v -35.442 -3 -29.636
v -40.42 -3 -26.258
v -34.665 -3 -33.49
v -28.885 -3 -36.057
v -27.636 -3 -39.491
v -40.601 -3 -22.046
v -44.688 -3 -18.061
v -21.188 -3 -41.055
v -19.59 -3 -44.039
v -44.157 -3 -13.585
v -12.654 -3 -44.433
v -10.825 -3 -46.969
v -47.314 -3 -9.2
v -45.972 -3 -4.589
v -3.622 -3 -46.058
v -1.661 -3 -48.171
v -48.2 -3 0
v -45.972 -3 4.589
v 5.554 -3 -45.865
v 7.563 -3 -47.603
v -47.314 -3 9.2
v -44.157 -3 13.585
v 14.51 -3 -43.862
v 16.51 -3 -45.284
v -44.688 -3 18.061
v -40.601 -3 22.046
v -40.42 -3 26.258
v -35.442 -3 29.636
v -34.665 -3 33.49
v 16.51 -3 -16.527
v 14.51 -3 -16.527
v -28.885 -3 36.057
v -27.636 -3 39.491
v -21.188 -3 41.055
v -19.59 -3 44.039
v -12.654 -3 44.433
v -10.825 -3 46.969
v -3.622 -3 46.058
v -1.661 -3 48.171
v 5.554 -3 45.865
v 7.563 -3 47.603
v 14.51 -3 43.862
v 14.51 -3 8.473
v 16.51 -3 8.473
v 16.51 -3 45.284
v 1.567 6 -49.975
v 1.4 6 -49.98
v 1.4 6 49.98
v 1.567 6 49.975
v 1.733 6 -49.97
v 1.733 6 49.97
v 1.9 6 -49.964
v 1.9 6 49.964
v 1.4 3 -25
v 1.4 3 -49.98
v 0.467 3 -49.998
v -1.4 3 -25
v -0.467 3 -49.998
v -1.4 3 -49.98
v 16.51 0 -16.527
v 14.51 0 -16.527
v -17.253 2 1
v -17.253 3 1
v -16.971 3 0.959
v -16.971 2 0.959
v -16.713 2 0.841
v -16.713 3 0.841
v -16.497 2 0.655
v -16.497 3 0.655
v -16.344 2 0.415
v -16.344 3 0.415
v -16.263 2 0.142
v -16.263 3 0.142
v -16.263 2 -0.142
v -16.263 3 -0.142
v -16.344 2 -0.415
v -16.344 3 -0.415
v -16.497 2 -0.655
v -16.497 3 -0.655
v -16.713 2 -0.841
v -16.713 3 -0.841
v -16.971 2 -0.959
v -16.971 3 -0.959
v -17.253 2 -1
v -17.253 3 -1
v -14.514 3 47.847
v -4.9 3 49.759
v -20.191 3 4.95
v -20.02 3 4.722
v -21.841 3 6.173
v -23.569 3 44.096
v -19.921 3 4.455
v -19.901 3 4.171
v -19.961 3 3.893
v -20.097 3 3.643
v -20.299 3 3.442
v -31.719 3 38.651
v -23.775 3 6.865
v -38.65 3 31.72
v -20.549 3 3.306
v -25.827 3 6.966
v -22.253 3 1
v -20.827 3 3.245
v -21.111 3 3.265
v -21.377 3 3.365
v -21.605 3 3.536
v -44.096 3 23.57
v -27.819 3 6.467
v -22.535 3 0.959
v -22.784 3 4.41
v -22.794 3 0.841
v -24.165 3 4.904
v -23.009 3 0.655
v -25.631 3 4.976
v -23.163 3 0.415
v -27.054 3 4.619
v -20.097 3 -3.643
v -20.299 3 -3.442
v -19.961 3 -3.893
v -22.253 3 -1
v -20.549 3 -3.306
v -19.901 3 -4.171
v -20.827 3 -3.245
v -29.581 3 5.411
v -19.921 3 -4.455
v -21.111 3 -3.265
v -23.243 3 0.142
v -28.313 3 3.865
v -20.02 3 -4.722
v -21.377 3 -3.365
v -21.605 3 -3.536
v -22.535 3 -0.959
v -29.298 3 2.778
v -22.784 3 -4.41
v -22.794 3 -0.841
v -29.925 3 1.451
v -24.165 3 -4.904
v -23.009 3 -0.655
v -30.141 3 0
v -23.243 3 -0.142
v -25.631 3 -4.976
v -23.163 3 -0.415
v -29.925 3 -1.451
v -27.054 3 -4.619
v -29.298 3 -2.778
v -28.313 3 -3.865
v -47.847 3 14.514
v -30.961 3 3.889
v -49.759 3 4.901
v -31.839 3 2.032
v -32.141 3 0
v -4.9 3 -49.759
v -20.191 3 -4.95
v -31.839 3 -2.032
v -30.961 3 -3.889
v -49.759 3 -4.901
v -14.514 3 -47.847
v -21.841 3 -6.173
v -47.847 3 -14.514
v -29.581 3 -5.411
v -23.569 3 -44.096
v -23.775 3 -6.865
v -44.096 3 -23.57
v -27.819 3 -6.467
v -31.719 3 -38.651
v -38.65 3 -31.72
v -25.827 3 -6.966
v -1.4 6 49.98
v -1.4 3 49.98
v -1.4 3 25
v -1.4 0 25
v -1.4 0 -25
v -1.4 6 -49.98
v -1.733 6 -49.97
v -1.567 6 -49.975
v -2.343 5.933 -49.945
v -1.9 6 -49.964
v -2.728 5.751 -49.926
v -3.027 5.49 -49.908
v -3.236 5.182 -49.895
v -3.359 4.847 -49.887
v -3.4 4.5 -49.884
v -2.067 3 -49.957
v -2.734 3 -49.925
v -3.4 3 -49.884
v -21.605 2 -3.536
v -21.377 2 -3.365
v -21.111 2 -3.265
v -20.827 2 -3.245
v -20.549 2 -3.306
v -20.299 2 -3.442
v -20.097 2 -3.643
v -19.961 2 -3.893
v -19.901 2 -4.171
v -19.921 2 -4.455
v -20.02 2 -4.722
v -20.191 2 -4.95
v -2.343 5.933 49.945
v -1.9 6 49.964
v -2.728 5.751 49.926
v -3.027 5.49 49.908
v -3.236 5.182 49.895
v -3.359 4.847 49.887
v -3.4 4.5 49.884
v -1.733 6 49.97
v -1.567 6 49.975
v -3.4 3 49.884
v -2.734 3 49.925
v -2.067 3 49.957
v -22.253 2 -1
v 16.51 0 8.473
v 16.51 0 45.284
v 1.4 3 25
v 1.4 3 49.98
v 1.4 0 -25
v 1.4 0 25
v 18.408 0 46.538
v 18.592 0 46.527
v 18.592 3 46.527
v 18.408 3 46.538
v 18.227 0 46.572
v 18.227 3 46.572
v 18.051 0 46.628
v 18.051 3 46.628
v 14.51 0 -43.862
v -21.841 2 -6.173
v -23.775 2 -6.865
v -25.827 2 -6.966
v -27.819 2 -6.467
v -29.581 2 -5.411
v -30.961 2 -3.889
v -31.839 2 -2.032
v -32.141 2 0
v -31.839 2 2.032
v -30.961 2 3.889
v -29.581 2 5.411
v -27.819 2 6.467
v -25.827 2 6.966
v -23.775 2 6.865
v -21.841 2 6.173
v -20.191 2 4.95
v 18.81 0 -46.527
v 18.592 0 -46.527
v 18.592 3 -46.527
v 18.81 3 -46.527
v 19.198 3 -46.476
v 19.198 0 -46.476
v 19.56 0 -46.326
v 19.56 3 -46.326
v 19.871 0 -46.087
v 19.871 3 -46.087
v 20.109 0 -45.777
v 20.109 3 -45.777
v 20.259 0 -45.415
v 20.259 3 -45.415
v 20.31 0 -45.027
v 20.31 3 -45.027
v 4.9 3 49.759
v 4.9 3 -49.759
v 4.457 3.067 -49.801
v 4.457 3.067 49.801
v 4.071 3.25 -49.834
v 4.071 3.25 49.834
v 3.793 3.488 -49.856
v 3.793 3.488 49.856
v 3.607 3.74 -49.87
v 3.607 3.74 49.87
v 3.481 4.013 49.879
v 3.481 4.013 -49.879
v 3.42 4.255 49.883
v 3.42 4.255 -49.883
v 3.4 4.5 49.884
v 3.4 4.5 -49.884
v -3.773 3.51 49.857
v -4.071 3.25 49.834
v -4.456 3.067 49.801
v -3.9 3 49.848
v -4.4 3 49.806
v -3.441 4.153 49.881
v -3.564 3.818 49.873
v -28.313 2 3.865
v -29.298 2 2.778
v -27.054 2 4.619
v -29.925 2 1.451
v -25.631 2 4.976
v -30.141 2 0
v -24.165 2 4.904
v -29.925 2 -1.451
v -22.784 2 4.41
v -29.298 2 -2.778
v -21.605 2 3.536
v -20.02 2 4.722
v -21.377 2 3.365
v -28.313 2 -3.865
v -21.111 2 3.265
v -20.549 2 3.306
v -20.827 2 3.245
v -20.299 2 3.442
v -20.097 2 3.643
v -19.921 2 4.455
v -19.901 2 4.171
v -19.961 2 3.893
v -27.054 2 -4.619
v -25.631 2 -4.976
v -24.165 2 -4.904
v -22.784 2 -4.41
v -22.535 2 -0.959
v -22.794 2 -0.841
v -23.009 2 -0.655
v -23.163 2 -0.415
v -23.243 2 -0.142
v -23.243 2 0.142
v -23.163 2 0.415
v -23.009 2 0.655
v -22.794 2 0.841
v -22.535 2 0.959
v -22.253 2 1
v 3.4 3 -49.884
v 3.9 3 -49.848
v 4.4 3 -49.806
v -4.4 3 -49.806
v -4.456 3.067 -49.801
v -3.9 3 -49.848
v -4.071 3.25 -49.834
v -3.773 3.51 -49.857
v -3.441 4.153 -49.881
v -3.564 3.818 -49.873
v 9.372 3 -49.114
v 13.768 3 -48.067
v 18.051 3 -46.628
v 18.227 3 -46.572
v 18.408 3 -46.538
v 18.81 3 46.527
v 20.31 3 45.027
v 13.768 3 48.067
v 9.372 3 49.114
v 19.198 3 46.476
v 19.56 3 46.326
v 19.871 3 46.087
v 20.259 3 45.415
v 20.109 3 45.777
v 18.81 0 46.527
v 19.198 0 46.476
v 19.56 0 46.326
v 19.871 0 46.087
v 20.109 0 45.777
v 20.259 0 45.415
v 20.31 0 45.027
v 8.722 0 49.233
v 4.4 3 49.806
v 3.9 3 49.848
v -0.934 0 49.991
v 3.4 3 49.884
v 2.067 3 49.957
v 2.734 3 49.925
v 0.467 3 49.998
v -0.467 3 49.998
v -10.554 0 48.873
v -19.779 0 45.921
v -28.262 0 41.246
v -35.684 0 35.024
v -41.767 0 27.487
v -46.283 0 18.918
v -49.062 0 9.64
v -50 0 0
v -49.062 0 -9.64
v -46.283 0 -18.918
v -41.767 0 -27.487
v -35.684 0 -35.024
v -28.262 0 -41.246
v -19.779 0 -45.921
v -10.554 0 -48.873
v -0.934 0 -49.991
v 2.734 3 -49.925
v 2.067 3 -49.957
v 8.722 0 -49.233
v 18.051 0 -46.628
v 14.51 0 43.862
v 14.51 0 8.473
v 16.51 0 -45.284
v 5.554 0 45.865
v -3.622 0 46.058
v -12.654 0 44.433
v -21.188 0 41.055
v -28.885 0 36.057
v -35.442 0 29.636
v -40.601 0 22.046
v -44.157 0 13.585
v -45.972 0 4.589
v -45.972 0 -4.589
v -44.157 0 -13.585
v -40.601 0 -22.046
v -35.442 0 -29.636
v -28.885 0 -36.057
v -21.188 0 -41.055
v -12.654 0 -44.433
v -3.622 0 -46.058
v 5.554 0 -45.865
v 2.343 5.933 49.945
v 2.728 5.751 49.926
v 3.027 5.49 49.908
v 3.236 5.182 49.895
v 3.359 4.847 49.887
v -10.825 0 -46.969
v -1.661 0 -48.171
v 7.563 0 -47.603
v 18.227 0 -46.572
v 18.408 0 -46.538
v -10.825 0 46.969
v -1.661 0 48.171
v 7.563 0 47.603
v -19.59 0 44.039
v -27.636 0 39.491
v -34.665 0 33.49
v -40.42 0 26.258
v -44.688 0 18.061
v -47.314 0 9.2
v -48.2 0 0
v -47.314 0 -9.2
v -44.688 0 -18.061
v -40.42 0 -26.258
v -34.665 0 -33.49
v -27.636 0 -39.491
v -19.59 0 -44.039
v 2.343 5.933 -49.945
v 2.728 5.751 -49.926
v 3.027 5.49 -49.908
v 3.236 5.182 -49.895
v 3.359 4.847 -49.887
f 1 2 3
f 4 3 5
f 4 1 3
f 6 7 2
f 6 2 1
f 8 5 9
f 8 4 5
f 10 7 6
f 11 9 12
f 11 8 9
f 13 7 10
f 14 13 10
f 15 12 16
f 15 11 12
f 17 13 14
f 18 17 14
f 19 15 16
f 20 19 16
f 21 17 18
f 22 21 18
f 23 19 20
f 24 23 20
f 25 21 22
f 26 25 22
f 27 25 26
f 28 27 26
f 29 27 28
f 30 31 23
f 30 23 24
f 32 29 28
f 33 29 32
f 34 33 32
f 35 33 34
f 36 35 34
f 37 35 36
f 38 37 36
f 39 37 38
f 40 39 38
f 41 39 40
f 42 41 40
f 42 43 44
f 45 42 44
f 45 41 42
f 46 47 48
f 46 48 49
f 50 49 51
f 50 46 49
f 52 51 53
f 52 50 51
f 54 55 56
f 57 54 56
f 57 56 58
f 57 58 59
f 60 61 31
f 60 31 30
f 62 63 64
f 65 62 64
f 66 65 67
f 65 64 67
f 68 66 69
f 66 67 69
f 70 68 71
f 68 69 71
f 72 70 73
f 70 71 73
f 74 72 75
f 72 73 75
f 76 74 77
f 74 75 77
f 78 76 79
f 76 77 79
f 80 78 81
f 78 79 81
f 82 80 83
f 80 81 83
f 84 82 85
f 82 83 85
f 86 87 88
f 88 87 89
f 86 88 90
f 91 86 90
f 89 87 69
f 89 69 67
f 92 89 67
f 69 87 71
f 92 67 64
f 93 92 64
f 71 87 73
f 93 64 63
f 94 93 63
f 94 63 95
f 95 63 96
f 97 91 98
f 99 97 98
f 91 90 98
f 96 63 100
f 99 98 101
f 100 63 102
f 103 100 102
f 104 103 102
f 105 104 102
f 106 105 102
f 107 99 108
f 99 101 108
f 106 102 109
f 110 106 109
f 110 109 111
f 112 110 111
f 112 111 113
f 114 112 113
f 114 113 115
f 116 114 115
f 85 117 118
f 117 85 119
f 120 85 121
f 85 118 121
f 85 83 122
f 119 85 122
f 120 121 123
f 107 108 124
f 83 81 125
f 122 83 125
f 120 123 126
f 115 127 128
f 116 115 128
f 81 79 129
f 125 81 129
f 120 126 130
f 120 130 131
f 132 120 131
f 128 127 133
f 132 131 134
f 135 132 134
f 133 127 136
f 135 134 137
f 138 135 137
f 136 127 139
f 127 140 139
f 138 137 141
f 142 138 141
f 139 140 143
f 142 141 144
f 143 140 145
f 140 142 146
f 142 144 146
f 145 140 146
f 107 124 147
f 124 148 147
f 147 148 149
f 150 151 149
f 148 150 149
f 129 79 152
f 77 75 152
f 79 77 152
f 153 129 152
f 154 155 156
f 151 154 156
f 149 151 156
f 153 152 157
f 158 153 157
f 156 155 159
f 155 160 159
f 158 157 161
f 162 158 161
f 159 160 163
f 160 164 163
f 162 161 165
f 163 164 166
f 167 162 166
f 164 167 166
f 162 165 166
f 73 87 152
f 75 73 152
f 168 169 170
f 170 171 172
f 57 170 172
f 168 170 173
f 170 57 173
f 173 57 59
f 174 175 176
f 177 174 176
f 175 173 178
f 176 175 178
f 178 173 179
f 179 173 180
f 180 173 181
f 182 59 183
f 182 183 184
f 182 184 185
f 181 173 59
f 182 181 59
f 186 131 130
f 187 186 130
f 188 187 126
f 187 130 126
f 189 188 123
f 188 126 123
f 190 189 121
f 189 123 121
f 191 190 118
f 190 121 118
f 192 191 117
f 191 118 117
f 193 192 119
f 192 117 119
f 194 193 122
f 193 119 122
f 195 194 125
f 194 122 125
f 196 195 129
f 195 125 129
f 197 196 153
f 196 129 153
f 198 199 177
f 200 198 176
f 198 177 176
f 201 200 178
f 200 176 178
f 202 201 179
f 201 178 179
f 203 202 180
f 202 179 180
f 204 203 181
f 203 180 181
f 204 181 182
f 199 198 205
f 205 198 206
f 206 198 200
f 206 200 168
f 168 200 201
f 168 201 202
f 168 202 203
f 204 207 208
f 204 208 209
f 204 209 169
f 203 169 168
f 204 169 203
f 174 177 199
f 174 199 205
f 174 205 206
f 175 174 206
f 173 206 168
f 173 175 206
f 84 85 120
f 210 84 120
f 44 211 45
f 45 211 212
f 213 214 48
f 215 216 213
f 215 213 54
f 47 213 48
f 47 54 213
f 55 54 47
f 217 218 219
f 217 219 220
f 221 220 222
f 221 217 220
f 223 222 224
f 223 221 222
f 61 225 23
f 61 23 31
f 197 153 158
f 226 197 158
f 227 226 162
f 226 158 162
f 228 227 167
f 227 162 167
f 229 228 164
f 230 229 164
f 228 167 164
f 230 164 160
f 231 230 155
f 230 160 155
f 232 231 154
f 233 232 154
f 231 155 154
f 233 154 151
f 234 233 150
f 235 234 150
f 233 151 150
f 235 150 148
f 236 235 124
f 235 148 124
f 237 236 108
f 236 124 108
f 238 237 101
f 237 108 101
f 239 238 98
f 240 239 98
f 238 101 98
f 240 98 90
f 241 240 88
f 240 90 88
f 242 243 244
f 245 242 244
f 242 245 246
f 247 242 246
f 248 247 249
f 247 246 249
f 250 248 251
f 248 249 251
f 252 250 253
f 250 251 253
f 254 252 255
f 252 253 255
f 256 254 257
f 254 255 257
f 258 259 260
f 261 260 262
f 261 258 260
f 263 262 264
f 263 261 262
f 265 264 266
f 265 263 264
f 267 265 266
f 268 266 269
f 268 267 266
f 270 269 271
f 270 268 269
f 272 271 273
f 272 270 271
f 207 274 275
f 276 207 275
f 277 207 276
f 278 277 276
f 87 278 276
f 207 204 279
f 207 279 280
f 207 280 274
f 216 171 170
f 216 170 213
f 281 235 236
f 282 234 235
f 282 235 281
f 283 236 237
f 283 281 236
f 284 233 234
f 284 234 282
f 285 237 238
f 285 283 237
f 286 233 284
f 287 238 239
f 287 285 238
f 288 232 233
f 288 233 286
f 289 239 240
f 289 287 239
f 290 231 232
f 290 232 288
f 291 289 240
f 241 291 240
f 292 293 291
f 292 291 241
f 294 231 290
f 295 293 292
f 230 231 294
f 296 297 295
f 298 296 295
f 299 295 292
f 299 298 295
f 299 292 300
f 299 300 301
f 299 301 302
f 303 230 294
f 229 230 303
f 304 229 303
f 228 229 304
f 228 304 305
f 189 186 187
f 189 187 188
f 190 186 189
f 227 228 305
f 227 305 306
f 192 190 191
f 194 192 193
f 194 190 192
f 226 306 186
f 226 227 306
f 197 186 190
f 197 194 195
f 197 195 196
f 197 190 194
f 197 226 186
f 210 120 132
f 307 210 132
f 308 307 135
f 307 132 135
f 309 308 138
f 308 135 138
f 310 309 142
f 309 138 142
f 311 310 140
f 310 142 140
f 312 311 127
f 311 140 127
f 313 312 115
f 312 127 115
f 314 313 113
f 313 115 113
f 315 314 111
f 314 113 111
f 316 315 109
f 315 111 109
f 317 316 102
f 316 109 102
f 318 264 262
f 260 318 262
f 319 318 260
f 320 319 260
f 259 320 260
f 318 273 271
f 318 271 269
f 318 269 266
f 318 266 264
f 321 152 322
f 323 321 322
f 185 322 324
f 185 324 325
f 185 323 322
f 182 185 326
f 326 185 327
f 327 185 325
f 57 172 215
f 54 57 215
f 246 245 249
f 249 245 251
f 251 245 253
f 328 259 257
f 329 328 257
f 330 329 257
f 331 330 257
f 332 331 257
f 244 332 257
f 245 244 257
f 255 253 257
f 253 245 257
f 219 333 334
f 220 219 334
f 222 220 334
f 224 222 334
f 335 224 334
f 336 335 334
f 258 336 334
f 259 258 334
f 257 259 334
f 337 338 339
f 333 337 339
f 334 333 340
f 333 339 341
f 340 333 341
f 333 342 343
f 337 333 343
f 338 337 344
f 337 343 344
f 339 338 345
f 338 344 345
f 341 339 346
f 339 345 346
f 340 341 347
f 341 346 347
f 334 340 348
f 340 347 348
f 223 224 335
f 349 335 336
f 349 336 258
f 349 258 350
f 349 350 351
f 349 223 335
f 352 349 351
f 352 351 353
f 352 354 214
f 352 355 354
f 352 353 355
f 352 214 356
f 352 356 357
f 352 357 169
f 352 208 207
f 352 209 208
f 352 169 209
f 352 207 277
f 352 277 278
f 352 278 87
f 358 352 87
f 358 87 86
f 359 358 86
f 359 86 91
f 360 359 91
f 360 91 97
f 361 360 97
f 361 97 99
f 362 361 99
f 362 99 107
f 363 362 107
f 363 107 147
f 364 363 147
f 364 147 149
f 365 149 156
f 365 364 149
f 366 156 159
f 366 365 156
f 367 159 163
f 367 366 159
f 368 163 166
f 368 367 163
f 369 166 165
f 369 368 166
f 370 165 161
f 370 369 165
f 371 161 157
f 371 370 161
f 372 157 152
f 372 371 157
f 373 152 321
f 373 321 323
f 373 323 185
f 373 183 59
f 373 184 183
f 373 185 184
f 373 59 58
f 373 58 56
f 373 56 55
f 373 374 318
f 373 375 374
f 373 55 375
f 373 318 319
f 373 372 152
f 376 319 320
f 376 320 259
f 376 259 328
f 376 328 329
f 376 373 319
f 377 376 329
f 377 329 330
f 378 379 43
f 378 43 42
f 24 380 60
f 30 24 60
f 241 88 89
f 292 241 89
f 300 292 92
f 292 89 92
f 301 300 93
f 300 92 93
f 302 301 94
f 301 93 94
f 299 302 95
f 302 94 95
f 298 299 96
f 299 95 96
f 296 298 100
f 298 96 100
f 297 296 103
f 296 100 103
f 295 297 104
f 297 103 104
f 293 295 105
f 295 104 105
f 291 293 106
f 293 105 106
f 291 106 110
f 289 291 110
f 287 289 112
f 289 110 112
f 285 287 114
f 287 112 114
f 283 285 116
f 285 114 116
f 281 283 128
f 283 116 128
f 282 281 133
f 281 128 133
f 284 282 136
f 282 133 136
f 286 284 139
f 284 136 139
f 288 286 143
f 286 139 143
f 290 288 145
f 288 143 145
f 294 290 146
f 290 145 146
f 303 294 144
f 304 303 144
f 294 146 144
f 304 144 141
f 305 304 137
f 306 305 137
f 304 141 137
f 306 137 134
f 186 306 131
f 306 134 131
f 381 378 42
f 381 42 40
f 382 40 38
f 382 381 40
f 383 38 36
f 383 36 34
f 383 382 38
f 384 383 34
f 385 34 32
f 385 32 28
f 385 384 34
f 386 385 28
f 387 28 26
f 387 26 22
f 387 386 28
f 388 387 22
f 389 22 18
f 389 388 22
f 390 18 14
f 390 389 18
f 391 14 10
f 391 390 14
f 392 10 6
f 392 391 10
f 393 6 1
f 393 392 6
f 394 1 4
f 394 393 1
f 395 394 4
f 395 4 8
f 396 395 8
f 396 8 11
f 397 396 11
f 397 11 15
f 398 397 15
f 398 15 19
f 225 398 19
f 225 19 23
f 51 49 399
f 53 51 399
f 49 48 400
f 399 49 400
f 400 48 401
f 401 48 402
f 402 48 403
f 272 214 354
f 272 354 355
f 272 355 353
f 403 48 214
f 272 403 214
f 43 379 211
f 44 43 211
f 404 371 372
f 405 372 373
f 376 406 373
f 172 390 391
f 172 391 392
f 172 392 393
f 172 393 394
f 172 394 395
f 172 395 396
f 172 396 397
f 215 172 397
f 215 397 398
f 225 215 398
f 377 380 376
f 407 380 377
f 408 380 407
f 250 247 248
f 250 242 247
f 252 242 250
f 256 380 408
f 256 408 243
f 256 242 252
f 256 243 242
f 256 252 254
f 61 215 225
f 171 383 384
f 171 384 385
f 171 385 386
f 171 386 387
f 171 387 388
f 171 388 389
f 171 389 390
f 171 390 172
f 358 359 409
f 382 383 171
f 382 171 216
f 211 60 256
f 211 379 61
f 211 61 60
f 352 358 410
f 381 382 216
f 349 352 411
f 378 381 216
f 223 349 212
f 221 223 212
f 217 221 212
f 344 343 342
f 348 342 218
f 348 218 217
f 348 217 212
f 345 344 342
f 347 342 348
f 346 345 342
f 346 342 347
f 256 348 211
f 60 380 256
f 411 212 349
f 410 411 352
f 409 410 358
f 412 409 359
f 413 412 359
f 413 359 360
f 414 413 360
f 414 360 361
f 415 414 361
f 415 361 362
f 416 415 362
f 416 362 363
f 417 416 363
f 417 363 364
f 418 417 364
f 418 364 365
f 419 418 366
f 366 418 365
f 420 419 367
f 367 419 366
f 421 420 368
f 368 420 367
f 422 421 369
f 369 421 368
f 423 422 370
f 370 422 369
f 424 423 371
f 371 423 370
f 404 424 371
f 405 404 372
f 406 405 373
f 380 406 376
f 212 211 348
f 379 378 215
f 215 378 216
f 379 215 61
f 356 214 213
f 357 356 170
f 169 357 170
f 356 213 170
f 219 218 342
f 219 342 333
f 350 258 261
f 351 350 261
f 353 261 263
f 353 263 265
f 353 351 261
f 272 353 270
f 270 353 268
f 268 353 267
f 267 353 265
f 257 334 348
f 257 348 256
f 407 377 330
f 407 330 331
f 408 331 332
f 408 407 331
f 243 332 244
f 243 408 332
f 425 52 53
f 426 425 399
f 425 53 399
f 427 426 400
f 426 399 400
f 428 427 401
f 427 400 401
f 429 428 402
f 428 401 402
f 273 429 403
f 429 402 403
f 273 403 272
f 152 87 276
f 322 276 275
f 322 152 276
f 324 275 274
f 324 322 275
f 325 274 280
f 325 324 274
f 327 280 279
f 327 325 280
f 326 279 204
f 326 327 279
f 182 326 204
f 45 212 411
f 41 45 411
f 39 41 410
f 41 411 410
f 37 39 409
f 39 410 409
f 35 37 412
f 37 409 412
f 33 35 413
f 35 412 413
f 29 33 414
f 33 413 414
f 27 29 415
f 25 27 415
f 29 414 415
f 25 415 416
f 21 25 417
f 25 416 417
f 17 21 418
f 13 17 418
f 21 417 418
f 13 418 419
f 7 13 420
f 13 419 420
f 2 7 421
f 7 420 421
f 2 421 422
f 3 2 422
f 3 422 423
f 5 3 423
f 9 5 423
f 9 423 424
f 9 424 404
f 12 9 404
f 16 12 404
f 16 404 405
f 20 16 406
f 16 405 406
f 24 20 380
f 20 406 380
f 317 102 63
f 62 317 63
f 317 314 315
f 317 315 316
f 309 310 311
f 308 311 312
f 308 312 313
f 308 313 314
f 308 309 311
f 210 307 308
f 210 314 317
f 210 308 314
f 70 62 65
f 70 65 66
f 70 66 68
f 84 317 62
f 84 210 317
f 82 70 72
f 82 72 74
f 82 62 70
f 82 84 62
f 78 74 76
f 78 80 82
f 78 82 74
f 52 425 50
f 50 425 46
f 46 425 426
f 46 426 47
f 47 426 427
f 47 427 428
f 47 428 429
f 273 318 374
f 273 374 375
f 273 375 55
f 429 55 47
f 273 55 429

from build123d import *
from build123d.topology import SkipClean

# Parameters (mm, degrees)
BOSS_EXTRUDE1_DEPTH     = 3
CUT_EXTRUDE1_DEPTH      = 71.774289117
CUT_EXTRUDE1_DEPTH_BACK = 71.774289117
SKETCH2_W               = 2.8
SKETCH2_H               = 50
BOSS_EXTRUDE2_DEPTH     = 3
SKETCH4_W               = 2
SKETCH4_H               = 25
CUT_EXTRUDE2_DEPTH      = 3
BOSS_EXTRUDE3_DEPTH     = 3
SKETCH7_W               = 93.053616802
SKETCH7_H               = 3
BOSS_EXTRUDE4_DEPTH     = 2
CUT_EXTRUDE3_DEPTH      = 1
FILLET1_R               = 1.5


with BuildPart() as part:
    # Sketch1 → Boss-Extrude1 (new body)
    with BuildSketch(Plane(origin=(0, 0, 0), x_dir=(1, 0, 0), z_dir=(0, 1, 0))):
        with BuildLine():
            Line((18.31, 46.526808401), (18.31, -46.526808401))
            ThreePointArc((18.31, -46.526808401), (-50, 0), (18.31, 46.526808401))
        make_face()
    extrude(amount=BOSS_EXTRUDE1_DEPTH)

    # Sketch2 → Cut-Extrude1 (cut, two sides: drawn at the far end of the back side and taken through both)
    with BuildSketch(Plane(origin=(0, 3, 0), x_dir=(1, 0, 0), z_dir=(0, 1, 0)).offset(-CUT_EXTRUDE1_DEPTH_BACK)):
        Rectangle(SKETCH2_W, SKETCH2_H)
    extrude(amount=CUT_EXTRUDE1_DEPTH + CUT_EXTRUDE1_DEPTH_BACK, mode=Mode.SUBTRACT)

    # Sketch3 → Boss-Extrude2 (add)
    with BuildSketch(Plane.XZ):
        with BuildLine():
            Line((16.51, -45.284212481), (16.51, 45.284212481))
            ThreePointArc((16.51, 45.284212481), (-48.2, 0), (16.51, -45.284212481))
        make_face()
        with BuildLine():
            Line((14.51, -43.862283342), (14.51, 43.862283342))
            ThreePointArc((14.51, 43.862283342), (-46.2, 0), (14.51, -43.862283342))
        make_face(mode=Mode.SUBTRACT)
    extrude(amount=BOSS_EXTRUDE2_DEPTH)

    # Sketch4 → Cut-Extrude2 (cut)
    with BuildSketch(Plane.XZ.offset(3)):
        with Locations((15.51, -4.026808401)):
            Rectangle(SKETCH4_W, SKETCH4_H)
    extrude(amount=-CUT_EXTRUDE2_DEPTH, mode=Mode.SUBTRACT)

    # Sketch6 → Boss-Extrude3 (add)
    with SkipClean():  # the faces are left unmerged after this step: merging them gives an invalid solid
        with BuildSketch(Plane(origin=(0, 3, 0), x_dir=(1, 0, 0), z_dir=(0, 1, 0))):
            with BuildLine():
                Line((-1.4, 25), (-1.4, 49.980396157))
                ThreePointArc((-1.4, 49.980396157), (-2.400481254, 49.942343655), (-3.4, 49.884266057))
                Line((-3.4, 49.884266057), (-3.4, -49.884266057))
                ThreePointArc((-3.4, -49.884266057), (-2.400481254, -49.942343655), (-1.4, -49.980396157))
                Line((-1.4, -49.980396157), (-1.4, -25))
                Line((-1.4, -25), (-1.4, 25))
            make_face()
            with BuildLine():
                ThreePointArc((3.4, 49.884266057), (2.400481254, 49.942343655), (1.4, 49.980396157))
                Line((1.4, 49.980396157), (1.4, 25))
                Line((1.4, 25), (1.4, -25))
                Line((1.4, -25), (1.4, -49.980396157))
                ThreePointArc((1.4, -49.980396157), (2.400481254, -49.942343655), (3.4, -49.884266057))
                Line((3.4, -49.884266057), (3.4, 49.884266057))
            make_face()
        extrude(amount=BOSS_EXTRUDE3_DEPTH)

    # Sketch7 → Boss-Extrude4 (add)
    with SkipClean():  # the faces are left unmerged after this step: merging them gives an invalid solid
        with BuildSketch(Plane(origin=(18.31, 0, 0), x_dir=(0, 0, -1), z_dir=(1, 0, 0))):
            with Locations((0, 1.5)):
                Rectangle(SKETCH7_W, SKETCH7_H)
        extrude(amount=BOSS_EXTRUDE4_DEPTH)

    # Sketch8 → Cut-Extrude3 (cut)
    with SkipClean():  # the faces are left unmerged after this step: merging them gives an invalid solid
        with BuildSketch(Plane(origin=(0, 3, 0), x_dir=(1, 0, 0), z_dir=(0, 1, 0))):
            with BuildLine():
                Line((-17.253164172, 1), (-22.253164172, 1))
                ThreePointArc((-22.253164172, 1), (-23.253164172, 0), (-22.253164172, -1))
                Line((-22.253164172, -1), (-17.253164172, -1))
                ThreePointArc((-17.253164172, -1), (-16.253164172, 0), (-17.253164172, 1))
            make_face()
            with BuildLine():
                ThreePointArc((-20.190928157, 4.949747468), (-32.140675626, 0), (-20.190928157, -4.949747468))
                ThreePointArc((-20.190928157, -4.949747468), (-20.190928157, -3.535533906), (-21.60514172, -3.535533906))
                ThreePointArc((-21.60514172, -3.535533906), (-30.140675626, 0), (-21.60514172, 3.535533906))
                ThreePointArc((-21.60514172, 3.535533906), (-20.190928157, 3.535533906), (-20.190928157, 4.949747468))
            make_face()
        extrude(amount=-CUT_EXTRUDE3_DEPTH, mode=Mode.SUBTRACT)

    # Fillet1
    # the kernel refuses this fillet: 1.5 mm, written as the material it adds along each edge
    with BuildSketch(Plane(origin=(18.31, 0, -46.526808401), x_dir=(-0.9315513824511361, 0, -0.3636097108898181), z_dir=(0, 1, 0))) as fillet1_piece_1:
        with BuildLine():
            CenterArc((0.282386116, -1.499994195), FILLET1_R, 90.159404468, 21.162642488)
            Line((-0.26302845, -0.102667121), (0, 0))
            ThreePointArc((0, 0), (0.139106461, -0.000193506), (0.278212923, 0))
        make_face()
    extrude(amount=3)
    with BuildSketch(Plane(origin=(18.31, 0, 46.526808401), x_dir=(-0.9315513824511399, 0, 0.3636097108898083), z_dir=(0, 1, 0))) as fillet1_piece_2:
        with BuildLine():
            CenterArc((0.282386116, 1.499994195), FILLET1_R, 248.677953043, 21.162642488)
            Line((-0.26302845, 0.102667121), (0, 0))
            ThreePointArc((0, 0), (0.139106461, 0.000193506), (0.278212923, 0))
        make_face()
    extrude(amount=3)
    with BuildSketch(Plane(origin=(-3.4, 3, -53.634266057), x_dir=(-1, 0, 0), z_dir=(0, 0, 1))) as fillet1_piece_3_section:
        with BuildLine():
            CenterArc((FILLET1_R, -FILLET1_R), FILLET1_R, 90, 90)
            Line((0, -FILLET1_R), (0, 0))
            Line((0, 0), (FILLET1_R, 0))
        make_face()
    fillet1_piece_3 = extrude(amount=107.268532113, mode=Mode.PRIVATE)
    fillet1_piece_3 = fillet1_piece_3 & Plane(origin=(0, 3.339687762, 0), x_dir=(0.36619999999999997, 0, 0.9305361680235755), z_dir=(0, -1, 0)) * Cylinder(50, 221, mode=Mode.PRIVATE)
    add(fillet1_piece_3)
    with BuildSketch(Plane(origin=(3.4, 3, 53.634266057), x_dir=(1, 0, 0), z_dir=(0, 0, -1))) as fillet1_piece_4_section:
        with BuildLine():
            CenterArc((FILLET1_R, -FILLET1_R), FILLET1_R, 90, 90)
            Line((0, -FILLET1_R), (0, 0))
            Line((0, 0), (FILLET1_R, 0))
        make_face()
    fillet1_piece_4 = extrude(amount=107.268532113, mode=Mode.PRIVATE)
    fillet1_piece_4 = fillet1_piece_4 & Plane(origin=(0, 3.339687762, 0), x_dir=(0.36619999999999997, 0, 0.9305361680235755), z_dir=(0, -1, 0)) * Cylinder(50, 221, mode=Mode.PRIVATE)
    add(fillet1_piece_4)
    # the kernel refuses this fillet: 1.5 mm, written as the material it takes off along each edge
    with BuildSketch(Plane(origin=(-3.4, 6, -53.634266057), x_dir=(0, -1, 0), z_dir=(0, 0, 1)), Plane(origin=(3.4, 6, 53.634266057), x_dir=(0, -1, 0), z_dir=(0, 0, -1))) as fillet1_2_piece_1:
        with BuildLine():
            CenterArc((FILLET1_R, FILLET1_R), FILLET1_R, 180, 90)
            Line((0, FILLET1_R), (0, 0))
            Line((0, 0), (FILLET1_R, 0))
        make_face()
    extrude(amount=107.268532113, mode=Mode.SUBTRACT)
    with BuildSketch(Plane(origin=(20.31, -3.75, 46.526808401), x_dir=(-1, 0, 0), z_dir=(0, 1, 0)), Plane(origin=(20.31, 6.75, -46.526808401), x_dir=(-1, 0, 0), z_dir=(0, -1, 0))) as fillet1_2_piece_2:
        with BuildLine():
            CenterArc((FILLET1_R, -FILLET1_R), FILLET1_R, 90, 90)
            Line((0, -FILLET1_R), (0, 0))
            Line((0, 0), (FILLET1_R, 0))
        make_face()
    extrude(amount=10.5, mode=Mode.SUBTRACT)


solid = part.part
